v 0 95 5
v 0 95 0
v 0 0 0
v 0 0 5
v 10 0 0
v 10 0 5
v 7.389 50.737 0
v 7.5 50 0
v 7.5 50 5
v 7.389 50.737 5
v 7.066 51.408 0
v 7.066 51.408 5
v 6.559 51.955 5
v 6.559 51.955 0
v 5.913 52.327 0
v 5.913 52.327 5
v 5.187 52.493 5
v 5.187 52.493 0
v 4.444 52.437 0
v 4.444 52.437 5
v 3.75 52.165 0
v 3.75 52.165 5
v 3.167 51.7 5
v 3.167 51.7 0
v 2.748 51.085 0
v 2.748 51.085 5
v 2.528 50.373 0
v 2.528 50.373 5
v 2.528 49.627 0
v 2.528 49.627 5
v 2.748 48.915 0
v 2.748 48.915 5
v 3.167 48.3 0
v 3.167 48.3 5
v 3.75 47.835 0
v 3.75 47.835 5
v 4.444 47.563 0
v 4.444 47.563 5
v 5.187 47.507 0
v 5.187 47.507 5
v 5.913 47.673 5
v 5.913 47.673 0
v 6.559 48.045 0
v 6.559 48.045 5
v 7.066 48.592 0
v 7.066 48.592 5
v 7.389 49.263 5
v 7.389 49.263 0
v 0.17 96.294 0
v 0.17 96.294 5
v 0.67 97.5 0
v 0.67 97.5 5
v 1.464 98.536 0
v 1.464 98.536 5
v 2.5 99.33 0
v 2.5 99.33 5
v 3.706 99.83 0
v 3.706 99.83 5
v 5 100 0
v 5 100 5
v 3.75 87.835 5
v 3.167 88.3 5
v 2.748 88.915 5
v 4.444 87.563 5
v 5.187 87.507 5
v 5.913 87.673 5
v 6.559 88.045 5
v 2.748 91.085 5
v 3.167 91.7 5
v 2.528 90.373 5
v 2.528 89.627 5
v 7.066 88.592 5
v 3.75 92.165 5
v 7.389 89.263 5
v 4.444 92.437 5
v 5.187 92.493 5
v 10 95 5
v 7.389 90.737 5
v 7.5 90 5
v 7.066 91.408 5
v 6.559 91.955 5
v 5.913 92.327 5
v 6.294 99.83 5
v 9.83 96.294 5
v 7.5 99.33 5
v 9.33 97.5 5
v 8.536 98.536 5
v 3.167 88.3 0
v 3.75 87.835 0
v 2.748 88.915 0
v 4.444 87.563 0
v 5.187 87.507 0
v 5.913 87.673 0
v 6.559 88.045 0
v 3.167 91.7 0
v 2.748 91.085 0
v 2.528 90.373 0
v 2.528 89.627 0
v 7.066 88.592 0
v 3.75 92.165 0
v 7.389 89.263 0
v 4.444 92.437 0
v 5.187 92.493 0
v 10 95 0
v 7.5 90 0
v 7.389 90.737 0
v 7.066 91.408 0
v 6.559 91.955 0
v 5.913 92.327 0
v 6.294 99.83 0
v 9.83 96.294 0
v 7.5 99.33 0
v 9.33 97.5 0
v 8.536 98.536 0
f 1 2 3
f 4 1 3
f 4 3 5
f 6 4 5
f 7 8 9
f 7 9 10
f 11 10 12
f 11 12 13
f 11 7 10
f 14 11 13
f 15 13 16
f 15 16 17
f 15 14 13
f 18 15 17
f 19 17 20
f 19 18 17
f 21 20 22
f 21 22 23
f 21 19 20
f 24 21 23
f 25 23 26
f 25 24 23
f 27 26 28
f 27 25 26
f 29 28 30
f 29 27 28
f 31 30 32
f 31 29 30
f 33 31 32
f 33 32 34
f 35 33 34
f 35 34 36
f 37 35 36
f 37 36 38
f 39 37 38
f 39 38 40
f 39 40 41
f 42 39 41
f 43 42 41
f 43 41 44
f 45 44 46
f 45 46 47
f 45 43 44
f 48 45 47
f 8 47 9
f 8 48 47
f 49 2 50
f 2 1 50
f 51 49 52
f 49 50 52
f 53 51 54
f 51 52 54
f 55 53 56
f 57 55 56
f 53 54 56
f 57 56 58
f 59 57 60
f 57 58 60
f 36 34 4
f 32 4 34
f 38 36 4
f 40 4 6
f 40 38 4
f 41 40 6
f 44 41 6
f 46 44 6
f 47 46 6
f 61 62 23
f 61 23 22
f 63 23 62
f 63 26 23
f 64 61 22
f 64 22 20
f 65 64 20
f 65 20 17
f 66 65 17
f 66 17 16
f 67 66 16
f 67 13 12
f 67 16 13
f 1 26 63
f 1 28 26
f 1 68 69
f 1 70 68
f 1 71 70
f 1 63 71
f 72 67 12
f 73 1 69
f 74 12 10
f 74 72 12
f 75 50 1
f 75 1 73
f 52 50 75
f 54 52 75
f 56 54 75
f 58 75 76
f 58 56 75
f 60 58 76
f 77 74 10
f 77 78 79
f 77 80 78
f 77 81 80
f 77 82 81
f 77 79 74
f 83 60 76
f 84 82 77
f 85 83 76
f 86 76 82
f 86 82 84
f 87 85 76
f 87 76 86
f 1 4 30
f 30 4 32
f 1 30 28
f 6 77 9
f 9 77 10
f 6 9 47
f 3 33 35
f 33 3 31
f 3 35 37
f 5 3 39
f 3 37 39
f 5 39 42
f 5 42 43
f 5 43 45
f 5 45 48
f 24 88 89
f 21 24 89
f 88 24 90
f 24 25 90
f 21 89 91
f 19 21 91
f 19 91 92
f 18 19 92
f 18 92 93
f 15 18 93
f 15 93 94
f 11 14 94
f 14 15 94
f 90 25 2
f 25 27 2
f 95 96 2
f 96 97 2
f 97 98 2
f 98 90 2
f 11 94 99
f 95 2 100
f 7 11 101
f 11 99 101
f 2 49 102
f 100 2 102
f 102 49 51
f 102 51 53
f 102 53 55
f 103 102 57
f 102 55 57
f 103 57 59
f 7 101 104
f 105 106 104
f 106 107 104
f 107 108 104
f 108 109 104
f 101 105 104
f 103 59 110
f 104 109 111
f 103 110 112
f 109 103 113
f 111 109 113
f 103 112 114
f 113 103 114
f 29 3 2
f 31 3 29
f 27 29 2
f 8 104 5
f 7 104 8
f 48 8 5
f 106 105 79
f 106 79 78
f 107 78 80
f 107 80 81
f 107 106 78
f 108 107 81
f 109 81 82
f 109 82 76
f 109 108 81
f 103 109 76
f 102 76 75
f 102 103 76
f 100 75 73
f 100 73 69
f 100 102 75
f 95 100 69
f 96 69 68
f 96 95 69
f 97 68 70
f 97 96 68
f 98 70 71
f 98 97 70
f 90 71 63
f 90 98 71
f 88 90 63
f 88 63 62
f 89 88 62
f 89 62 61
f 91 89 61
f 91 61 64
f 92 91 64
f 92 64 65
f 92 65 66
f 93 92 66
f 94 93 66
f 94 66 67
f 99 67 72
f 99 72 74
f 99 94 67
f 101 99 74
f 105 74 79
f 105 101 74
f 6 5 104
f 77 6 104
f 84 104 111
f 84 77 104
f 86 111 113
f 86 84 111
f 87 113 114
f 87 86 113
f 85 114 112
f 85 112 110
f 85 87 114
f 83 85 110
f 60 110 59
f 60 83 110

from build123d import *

# Parameters (mm, degrees)
F0_R     = 2.5
F1_DEPTH = 5
F2_R     = 4.99999


# Not quite as in the source:
# - a fillet or chamfer is up to 0.001 mm smaller than in the source, because OpenCascade refuses the exact size


with BuildPart() as f1:
    # F0 (on Top) → F1 (new body)
    with BuildSketch(Plane.XY):
        Polygon((0, 50), (0, 0), (10, 0), (10, 100), (0, 100), align=None)
        with Locations((5, 50)):
            Circle(F0_R, mode=Mode.SUBTRACT)
        with Locations((5, 90)):
            Circle(F0_R, mode=Mode.SUBTRACT)
    extrude(amount=F1_DEPTH)

    # F2 (radius 5 in the source; OpenCascade refuses exactly that, so slightly less here)
    f2_edges = [f1.edges().sort_by_distance(p)[0] for p in [
        (0, 100, 2.5),
        (10, 100, 2.5),
    ]]
    fillet(f2_edges, radius=F2_R)


solid = f1.part
